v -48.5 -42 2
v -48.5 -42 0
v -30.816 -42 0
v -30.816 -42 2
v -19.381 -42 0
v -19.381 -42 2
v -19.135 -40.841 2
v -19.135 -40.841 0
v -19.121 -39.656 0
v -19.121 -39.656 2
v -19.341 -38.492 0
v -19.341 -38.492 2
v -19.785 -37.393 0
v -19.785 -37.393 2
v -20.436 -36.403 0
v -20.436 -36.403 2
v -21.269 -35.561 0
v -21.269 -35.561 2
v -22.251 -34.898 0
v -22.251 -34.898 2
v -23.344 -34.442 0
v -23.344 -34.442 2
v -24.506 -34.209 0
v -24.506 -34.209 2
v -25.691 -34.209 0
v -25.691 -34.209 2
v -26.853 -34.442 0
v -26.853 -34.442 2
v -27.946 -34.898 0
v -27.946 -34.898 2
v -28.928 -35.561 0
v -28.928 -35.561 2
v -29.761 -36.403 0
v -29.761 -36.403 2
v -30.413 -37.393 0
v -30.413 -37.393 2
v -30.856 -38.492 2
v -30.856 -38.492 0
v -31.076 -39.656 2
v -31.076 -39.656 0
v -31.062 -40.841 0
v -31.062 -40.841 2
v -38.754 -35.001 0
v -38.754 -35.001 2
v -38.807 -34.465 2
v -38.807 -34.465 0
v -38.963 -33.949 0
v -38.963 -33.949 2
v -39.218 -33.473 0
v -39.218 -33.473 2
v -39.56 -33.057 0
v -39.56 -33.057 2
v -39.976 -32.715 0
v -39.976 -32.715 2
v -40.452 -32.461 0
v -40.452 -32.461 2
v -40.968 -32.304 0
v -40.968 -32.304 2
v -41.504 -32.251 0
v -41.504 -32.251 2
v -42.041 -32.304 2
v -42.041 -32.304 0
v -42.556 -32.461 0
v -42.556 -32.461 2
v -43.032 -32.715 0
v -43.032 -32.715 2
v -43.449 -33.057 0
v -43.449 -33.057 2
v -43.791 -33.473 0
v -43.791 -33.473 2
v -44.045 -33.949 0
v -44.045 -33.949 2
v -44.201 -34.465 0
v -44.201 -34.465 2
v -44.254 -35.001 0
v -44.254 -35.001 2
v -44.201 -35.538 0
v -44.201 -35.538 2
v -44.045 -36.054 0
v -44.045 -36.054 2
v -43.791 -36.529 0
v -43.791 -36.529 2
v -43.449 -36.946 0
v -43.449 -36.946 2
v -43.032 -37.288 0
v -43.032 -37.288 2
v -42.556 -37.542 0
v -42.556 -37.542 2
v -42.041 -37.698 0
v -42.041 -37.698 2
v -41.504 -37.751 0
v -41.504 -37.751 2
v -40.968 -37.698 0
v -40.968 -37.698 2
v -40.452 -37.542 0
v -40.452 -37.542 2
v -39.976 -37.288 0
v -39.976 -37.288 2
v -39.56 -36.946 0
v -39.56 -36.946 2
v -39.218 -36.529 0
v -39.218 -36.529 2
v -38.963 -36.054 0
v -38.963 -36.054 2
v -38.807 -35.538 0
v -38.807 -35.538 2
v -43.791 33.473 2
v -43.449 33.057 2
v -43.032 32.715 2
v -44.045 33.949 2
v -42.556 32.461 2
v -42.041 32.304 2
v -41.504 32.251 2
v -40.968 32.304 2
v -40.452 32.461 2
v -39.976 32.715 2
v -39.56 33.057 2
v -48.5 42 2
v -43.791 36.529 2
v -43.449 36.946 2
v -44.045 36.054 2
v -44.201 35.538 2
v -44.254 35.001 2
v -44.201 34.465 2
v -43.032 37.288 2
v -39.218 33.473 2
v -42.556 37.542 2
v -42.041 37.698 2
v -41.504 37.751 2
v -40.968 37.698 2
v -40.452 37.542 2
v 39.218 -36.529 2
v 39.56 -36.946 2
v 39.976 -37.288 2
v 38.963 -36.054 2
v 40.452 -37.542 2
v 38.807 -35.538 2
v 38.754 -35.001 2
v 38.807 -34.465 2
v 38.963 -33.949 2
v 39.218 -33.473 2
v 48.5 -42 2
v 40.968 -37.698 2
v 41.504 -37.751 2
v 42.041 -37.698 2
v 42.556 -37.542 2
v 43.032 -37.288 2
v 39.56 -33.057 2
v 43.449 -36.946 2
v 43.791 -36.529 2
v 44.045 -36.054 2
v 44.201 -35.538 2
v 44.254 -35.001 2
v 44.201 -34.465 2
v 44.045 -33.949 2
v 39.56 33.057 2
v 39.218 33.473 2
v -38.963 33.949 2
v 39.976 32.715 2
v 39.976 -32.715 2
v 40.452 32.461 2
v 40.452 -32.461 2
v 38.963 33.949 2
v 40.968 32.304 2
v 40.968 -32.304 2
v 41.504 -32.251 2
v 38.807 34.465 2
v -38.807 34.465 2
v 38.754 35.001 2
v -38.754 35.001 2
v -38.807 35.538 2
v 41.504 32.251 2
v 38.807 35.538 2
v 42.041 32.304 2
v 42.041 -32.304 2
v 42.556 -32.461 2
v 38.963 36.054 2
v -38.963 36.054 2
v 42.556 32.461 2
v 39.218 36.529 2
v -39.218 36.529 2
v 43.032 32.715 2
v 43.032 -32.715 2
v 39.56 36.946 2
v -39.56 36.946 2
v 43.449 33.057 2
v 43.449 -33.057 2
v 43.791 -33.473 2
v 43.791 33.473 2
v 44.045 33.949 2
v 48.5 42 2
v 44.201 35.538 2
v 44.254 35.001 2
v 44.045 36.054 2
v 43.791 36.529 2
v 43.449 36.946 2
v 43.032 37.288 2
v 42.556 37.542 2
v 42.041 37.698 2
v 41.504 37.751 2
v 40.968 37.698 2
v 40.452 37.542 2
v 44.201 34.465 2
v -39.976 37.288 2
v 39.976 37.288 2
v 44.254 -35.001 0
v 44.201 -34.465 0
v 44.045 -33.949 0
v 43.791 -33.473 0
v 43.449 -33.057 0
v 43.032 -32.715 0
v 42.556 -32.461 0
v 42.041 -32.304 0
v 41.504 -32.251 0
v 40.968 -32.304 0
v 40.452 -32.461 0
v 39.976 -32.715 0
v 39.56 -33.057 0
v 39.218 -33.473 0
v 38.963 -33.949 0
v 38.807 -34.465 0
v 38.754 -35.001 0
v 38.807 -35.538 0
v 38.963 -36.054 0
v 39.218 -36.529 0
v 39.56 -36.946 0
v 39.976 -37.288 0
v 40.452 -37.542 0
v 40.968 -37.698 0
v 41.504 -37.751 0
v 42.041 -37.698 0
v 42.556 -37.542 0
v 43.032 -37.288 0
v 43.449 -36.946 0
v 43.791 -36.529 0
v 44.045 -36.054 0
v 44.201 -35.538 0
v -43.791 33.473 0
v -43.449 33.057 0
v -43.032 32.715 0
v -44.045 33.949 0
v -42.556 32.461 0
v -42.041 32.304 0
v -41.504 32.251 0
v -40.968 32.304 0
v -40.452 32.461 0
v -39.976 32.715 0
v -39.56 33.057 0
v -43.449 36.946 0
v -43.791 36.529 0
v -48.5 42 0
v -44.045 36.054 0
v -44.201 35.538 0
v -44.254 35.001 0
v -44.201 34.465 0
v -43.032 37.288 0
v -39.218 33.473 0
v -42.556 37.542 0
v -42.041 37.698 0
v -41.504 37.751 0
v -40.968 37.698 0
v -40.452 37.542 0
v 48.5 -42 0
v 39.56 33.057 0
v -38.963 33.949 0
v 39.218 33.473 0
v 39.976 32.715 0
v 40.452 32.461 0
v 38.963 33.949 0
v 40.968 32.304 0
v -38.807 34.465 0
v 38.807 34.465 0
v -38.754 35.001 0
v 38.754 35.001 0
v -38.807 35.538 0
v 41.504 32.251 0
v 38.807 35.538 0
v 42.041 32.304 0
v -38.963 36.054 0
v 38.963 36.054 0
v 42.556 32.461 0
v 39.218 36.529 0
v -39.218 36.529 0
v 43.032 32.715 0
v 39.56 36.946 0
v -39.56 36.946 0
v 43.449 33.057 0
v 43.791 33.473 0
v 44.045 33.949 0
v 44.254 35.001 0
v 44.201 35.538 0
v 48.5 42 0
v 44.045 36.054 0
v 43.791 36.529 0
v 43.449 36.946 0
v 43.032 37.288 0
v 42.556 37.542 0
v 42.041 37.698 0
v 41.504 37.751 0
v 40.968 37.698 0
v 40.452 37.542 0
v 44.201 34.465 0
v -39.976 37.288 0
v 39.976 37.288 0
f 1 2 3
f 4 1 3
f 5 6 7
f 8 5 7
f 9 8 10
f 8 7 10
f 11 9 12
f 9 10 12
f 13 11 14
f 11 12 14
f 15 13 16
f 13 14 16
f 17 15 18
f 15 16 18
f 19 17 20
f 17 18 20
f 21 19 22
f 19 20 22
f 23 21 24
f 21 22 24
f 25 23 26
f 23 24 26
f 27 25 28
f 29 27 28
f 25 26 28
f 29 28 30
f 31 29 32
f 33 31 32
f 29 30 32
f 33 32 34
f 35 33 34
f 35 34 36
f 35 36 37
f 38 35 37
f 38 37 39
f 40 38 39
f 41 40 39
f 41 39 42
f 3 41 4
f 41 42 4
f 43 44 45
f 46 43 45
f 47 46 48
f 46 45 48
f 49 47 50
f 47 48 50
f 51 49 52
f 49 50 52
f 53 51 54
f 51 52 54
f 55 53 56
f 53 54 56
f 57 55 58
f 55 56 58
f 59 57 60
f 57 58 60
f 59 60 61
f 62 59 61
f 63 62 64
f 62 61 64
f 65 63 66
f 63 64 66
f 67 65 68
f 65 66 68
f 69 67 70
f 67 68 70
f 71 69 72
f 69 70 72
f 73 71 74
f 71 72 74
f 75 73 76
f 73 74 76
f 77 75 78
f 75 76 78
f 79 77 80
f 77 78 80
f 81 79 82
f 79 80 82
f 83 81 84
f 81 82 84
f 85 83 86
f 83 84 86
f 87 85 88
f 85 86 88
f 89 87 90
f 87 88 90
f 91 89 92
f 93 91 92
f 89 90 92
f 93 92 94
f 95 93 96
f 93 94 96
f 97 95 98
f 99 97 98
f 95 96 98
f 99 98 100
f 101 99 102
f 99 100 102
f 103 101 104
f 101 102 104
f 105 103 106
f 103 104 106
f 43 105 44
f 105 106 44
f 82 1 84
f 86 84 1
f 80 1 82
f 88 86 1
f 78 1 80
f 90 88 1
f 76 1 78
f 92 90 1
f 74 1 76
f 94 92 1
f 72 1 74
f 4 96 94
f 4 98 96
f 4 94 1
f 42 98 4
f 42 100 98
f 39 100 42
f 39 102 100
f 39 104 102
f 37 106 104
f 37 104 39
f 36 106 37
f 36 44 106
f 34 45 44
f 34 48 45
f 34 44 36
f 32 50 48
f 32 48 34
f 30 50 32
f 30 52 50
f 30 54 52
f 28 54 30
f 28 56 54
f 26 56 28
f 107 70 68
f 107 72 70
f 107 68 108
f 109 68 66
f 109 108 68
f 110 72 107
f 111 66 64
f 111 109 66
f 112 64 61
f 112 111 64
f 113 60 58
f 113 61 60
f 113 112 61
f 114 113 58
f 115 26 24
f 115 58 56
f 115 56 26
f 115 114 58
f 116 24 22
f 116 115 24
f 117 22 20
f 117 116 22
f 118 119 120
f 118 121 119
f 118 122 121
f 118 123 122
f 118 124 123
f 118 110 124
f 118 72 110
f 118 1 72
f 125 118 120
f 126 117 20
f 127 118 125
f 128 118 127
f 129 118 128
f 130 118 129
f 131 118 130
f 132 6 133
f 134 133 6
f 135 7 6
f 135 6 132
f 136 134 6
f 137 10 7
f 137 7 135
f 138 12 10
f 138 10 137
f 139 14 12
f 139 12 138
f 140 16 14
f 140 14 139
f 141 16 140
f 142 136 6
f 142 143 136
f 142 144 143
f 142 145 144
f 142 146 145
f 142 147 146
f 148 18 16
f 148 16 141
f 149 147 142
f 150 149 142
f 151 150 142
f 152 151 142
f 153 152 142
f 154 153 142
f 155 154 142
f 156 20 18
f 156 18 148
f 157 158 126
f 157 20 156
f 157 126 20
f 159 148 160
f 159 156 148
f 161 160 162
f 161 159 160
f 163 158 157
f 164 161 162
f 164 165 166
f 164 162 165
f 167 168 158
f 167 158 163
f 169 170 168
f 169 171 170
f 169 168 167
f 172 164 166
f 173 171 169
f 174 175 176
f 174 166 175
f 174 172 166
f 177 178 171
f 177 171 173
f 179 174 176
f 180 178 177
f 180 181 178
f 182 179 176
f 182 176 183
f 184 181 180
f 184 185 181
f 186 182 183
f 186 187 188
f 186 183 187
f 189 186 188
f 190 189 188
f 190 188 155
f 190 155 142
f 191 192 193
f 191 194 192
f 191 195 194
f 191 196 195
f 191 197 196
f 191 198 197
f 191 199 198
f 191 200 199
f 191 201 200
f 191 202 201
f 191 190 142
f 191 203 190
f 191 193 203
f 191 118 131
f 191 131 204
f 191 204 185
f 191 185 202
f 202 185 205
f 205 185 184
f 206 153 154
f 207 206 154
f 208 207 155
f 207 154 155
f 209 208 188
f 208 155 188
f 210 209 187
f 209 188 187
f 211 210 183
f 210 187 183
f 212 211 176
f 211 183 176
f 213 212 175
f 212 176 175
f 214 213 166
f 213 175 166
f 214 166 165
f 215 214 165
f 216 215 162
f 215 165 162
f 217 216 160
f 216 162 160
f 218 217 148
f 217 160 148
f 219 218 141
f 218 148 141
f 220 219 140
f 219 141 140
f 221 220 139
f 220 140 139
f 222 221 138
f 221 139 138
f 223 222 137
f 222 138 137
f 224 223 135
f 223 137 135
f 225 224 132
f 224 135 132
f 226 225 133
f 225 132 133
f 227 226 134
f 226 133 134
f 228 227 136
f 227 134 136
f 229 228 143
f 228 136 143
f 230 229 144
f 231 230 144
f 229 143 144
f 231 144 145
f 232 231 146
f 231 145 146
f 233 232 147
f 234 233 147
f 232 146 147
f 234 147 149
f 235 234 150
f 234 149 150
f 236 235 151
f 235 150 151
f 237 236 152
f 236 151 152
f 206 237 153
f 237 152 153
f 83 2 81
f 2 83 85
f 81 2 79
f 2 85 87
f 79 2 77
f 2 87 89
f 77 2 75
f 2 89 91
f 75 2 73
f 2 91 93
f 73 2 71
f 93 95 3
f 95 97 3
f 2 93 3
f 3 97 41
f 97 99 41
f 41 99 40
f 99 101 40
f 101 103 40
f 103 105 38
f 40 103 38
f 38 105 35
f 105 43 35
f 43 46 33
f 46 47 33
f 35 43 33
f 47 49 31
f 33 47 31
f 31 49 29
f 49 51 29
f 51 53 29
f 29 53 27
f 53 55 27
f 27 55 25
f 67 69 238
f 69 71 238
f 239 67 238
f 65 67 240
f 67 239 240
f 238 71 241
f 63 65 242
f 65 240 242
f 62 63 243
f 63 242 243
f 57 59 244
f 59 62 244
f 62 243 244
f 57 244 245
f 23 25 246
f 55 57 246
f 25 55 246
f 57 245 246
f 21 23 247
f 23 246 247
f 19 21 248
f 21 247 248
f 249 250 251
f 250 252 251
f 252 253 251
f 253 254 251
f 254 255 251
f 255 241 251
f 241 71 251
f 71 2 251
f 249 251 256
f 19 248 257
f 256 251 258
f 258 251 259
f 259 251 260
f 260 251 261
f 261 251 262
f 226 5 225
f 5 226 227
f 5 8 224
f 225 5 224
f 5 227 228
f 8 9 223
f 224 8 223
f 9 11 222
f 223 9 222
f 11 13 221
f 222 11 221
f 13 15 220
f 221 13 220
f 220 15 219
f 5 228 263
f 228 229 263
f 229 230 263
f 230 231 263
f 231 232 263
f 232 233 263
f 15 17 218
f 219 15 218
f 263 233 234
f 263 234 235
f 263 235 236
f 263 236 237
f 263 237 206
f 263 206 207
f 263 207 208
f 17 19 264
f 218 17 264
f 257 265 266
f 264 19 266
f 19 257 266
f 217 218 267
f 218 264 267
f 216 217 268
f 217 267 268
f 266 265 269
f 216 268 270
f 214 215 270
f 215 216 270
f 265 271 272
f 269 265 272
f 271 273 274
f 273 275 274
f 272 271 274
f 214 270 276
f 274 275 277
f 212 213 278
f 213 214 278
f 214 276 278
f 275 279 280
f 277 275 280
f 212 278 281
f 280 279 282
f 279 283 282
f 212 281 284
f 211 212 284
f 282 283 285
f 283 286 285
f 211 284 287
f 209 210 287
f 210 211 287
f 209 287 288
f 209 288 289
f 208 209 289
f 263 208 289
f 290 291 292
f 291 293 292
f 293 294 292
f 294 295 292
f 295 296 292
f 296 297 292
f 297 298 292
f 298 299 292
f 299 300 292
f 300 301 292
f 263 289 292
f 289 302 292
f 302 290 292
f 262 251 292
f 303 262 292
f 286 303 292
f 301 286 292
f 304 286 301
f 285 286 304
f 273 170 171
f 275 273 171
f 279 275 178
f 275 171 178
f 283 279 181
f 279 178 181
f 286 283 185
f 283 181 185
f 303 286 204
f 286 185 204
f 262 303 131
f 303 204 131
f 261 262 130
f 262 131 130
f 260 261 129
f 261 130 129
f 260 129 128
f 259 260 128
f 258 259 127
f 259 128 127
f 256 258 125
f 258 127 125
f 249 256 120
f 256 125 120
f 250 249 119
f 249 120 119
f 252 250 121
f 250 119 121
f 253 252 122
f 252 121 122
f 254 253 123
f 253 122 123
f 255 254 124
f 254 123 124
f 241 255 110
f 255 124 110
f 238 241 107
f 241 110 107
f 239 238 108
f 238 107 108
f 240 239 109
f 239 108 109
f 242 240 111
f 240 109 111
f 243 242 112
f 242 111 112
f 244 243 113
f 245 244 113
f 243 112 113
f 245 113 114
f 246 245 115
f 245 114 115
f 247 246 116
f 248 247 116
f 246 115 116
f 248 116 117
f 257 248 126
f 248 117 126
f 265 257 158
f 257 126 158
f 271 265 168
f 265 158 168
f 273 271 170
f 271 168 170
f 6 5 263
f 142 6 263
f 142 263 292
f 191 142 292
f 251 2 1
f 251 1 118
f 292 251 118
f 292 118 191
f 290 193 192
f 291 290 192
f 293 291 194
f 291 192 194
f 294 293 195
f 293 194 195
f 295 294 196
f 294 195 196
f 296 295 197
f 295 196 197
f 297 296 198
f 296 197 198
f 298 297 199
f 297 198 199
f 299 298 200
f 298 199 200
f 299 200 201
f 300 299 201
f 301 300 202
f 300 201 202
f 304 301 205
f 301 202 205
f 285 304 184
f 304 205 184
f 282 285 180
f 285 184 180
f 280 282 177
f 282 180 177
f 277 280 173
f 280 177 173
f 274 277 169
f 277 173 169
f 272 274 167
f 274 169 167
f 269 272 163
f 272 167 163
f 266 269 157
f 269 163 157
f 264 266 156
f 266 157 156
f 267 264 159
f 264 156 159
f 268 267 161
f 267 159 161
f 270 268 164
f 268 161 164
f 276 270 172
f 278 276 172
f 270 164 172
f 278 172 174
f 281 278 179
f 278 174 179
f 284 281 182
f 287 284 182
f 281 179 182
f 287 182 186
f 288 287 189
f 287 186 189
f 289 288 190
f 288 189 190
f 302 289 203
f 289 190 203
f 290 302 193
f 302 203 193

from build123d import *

# Parameters (mm, degrees)
F0_W     = 97
F0_H     = 84
F1_DEPTH = 2
F2_R     = 2.75
F3_DEPTH = 2
F5_DEPTH = 2


with BuildPart() as f1:
    # F0 (on Top) → F1 (new body)
    with BuildSketch(Plane.XY):
        Rectangle(F0_W, F0_H)
    extrude(amount=F1_DEPTH)

    # F2 (on face) → F3 (cut, through all)
    with BuildSketch(Plane.XY.offset(2)):
        with Locations((-41.504115, 35.0012)):
            Circle(F2_R)
        with Locations((41.504115, 35.0012)):
            Circle(F2_R)
        with Locations((41.504115, -35.0012)):
            Circle(F2_R)
        with Locations((-41.504115, -35.0012)):
            Circle(F2_R)
    extrude(amount=-F3_DEPTH, mode=Mode.SUBTRACT)

    # F4 (on face) → F5 (cut, through all)
    with BuildSketch(Plane.XY.offset(2)):
        with BuildLine():
            Line((-30.815778, -42), (-19.381491, -42))
            ThreePointArc((-19.381491, -42), (-25.098634, -34.179487), (-30.815778, -42))
        make_face()
    extrude(amount=-F5_DEPTH, mode=Mode.SUBTRACT)


solid = f1.part
